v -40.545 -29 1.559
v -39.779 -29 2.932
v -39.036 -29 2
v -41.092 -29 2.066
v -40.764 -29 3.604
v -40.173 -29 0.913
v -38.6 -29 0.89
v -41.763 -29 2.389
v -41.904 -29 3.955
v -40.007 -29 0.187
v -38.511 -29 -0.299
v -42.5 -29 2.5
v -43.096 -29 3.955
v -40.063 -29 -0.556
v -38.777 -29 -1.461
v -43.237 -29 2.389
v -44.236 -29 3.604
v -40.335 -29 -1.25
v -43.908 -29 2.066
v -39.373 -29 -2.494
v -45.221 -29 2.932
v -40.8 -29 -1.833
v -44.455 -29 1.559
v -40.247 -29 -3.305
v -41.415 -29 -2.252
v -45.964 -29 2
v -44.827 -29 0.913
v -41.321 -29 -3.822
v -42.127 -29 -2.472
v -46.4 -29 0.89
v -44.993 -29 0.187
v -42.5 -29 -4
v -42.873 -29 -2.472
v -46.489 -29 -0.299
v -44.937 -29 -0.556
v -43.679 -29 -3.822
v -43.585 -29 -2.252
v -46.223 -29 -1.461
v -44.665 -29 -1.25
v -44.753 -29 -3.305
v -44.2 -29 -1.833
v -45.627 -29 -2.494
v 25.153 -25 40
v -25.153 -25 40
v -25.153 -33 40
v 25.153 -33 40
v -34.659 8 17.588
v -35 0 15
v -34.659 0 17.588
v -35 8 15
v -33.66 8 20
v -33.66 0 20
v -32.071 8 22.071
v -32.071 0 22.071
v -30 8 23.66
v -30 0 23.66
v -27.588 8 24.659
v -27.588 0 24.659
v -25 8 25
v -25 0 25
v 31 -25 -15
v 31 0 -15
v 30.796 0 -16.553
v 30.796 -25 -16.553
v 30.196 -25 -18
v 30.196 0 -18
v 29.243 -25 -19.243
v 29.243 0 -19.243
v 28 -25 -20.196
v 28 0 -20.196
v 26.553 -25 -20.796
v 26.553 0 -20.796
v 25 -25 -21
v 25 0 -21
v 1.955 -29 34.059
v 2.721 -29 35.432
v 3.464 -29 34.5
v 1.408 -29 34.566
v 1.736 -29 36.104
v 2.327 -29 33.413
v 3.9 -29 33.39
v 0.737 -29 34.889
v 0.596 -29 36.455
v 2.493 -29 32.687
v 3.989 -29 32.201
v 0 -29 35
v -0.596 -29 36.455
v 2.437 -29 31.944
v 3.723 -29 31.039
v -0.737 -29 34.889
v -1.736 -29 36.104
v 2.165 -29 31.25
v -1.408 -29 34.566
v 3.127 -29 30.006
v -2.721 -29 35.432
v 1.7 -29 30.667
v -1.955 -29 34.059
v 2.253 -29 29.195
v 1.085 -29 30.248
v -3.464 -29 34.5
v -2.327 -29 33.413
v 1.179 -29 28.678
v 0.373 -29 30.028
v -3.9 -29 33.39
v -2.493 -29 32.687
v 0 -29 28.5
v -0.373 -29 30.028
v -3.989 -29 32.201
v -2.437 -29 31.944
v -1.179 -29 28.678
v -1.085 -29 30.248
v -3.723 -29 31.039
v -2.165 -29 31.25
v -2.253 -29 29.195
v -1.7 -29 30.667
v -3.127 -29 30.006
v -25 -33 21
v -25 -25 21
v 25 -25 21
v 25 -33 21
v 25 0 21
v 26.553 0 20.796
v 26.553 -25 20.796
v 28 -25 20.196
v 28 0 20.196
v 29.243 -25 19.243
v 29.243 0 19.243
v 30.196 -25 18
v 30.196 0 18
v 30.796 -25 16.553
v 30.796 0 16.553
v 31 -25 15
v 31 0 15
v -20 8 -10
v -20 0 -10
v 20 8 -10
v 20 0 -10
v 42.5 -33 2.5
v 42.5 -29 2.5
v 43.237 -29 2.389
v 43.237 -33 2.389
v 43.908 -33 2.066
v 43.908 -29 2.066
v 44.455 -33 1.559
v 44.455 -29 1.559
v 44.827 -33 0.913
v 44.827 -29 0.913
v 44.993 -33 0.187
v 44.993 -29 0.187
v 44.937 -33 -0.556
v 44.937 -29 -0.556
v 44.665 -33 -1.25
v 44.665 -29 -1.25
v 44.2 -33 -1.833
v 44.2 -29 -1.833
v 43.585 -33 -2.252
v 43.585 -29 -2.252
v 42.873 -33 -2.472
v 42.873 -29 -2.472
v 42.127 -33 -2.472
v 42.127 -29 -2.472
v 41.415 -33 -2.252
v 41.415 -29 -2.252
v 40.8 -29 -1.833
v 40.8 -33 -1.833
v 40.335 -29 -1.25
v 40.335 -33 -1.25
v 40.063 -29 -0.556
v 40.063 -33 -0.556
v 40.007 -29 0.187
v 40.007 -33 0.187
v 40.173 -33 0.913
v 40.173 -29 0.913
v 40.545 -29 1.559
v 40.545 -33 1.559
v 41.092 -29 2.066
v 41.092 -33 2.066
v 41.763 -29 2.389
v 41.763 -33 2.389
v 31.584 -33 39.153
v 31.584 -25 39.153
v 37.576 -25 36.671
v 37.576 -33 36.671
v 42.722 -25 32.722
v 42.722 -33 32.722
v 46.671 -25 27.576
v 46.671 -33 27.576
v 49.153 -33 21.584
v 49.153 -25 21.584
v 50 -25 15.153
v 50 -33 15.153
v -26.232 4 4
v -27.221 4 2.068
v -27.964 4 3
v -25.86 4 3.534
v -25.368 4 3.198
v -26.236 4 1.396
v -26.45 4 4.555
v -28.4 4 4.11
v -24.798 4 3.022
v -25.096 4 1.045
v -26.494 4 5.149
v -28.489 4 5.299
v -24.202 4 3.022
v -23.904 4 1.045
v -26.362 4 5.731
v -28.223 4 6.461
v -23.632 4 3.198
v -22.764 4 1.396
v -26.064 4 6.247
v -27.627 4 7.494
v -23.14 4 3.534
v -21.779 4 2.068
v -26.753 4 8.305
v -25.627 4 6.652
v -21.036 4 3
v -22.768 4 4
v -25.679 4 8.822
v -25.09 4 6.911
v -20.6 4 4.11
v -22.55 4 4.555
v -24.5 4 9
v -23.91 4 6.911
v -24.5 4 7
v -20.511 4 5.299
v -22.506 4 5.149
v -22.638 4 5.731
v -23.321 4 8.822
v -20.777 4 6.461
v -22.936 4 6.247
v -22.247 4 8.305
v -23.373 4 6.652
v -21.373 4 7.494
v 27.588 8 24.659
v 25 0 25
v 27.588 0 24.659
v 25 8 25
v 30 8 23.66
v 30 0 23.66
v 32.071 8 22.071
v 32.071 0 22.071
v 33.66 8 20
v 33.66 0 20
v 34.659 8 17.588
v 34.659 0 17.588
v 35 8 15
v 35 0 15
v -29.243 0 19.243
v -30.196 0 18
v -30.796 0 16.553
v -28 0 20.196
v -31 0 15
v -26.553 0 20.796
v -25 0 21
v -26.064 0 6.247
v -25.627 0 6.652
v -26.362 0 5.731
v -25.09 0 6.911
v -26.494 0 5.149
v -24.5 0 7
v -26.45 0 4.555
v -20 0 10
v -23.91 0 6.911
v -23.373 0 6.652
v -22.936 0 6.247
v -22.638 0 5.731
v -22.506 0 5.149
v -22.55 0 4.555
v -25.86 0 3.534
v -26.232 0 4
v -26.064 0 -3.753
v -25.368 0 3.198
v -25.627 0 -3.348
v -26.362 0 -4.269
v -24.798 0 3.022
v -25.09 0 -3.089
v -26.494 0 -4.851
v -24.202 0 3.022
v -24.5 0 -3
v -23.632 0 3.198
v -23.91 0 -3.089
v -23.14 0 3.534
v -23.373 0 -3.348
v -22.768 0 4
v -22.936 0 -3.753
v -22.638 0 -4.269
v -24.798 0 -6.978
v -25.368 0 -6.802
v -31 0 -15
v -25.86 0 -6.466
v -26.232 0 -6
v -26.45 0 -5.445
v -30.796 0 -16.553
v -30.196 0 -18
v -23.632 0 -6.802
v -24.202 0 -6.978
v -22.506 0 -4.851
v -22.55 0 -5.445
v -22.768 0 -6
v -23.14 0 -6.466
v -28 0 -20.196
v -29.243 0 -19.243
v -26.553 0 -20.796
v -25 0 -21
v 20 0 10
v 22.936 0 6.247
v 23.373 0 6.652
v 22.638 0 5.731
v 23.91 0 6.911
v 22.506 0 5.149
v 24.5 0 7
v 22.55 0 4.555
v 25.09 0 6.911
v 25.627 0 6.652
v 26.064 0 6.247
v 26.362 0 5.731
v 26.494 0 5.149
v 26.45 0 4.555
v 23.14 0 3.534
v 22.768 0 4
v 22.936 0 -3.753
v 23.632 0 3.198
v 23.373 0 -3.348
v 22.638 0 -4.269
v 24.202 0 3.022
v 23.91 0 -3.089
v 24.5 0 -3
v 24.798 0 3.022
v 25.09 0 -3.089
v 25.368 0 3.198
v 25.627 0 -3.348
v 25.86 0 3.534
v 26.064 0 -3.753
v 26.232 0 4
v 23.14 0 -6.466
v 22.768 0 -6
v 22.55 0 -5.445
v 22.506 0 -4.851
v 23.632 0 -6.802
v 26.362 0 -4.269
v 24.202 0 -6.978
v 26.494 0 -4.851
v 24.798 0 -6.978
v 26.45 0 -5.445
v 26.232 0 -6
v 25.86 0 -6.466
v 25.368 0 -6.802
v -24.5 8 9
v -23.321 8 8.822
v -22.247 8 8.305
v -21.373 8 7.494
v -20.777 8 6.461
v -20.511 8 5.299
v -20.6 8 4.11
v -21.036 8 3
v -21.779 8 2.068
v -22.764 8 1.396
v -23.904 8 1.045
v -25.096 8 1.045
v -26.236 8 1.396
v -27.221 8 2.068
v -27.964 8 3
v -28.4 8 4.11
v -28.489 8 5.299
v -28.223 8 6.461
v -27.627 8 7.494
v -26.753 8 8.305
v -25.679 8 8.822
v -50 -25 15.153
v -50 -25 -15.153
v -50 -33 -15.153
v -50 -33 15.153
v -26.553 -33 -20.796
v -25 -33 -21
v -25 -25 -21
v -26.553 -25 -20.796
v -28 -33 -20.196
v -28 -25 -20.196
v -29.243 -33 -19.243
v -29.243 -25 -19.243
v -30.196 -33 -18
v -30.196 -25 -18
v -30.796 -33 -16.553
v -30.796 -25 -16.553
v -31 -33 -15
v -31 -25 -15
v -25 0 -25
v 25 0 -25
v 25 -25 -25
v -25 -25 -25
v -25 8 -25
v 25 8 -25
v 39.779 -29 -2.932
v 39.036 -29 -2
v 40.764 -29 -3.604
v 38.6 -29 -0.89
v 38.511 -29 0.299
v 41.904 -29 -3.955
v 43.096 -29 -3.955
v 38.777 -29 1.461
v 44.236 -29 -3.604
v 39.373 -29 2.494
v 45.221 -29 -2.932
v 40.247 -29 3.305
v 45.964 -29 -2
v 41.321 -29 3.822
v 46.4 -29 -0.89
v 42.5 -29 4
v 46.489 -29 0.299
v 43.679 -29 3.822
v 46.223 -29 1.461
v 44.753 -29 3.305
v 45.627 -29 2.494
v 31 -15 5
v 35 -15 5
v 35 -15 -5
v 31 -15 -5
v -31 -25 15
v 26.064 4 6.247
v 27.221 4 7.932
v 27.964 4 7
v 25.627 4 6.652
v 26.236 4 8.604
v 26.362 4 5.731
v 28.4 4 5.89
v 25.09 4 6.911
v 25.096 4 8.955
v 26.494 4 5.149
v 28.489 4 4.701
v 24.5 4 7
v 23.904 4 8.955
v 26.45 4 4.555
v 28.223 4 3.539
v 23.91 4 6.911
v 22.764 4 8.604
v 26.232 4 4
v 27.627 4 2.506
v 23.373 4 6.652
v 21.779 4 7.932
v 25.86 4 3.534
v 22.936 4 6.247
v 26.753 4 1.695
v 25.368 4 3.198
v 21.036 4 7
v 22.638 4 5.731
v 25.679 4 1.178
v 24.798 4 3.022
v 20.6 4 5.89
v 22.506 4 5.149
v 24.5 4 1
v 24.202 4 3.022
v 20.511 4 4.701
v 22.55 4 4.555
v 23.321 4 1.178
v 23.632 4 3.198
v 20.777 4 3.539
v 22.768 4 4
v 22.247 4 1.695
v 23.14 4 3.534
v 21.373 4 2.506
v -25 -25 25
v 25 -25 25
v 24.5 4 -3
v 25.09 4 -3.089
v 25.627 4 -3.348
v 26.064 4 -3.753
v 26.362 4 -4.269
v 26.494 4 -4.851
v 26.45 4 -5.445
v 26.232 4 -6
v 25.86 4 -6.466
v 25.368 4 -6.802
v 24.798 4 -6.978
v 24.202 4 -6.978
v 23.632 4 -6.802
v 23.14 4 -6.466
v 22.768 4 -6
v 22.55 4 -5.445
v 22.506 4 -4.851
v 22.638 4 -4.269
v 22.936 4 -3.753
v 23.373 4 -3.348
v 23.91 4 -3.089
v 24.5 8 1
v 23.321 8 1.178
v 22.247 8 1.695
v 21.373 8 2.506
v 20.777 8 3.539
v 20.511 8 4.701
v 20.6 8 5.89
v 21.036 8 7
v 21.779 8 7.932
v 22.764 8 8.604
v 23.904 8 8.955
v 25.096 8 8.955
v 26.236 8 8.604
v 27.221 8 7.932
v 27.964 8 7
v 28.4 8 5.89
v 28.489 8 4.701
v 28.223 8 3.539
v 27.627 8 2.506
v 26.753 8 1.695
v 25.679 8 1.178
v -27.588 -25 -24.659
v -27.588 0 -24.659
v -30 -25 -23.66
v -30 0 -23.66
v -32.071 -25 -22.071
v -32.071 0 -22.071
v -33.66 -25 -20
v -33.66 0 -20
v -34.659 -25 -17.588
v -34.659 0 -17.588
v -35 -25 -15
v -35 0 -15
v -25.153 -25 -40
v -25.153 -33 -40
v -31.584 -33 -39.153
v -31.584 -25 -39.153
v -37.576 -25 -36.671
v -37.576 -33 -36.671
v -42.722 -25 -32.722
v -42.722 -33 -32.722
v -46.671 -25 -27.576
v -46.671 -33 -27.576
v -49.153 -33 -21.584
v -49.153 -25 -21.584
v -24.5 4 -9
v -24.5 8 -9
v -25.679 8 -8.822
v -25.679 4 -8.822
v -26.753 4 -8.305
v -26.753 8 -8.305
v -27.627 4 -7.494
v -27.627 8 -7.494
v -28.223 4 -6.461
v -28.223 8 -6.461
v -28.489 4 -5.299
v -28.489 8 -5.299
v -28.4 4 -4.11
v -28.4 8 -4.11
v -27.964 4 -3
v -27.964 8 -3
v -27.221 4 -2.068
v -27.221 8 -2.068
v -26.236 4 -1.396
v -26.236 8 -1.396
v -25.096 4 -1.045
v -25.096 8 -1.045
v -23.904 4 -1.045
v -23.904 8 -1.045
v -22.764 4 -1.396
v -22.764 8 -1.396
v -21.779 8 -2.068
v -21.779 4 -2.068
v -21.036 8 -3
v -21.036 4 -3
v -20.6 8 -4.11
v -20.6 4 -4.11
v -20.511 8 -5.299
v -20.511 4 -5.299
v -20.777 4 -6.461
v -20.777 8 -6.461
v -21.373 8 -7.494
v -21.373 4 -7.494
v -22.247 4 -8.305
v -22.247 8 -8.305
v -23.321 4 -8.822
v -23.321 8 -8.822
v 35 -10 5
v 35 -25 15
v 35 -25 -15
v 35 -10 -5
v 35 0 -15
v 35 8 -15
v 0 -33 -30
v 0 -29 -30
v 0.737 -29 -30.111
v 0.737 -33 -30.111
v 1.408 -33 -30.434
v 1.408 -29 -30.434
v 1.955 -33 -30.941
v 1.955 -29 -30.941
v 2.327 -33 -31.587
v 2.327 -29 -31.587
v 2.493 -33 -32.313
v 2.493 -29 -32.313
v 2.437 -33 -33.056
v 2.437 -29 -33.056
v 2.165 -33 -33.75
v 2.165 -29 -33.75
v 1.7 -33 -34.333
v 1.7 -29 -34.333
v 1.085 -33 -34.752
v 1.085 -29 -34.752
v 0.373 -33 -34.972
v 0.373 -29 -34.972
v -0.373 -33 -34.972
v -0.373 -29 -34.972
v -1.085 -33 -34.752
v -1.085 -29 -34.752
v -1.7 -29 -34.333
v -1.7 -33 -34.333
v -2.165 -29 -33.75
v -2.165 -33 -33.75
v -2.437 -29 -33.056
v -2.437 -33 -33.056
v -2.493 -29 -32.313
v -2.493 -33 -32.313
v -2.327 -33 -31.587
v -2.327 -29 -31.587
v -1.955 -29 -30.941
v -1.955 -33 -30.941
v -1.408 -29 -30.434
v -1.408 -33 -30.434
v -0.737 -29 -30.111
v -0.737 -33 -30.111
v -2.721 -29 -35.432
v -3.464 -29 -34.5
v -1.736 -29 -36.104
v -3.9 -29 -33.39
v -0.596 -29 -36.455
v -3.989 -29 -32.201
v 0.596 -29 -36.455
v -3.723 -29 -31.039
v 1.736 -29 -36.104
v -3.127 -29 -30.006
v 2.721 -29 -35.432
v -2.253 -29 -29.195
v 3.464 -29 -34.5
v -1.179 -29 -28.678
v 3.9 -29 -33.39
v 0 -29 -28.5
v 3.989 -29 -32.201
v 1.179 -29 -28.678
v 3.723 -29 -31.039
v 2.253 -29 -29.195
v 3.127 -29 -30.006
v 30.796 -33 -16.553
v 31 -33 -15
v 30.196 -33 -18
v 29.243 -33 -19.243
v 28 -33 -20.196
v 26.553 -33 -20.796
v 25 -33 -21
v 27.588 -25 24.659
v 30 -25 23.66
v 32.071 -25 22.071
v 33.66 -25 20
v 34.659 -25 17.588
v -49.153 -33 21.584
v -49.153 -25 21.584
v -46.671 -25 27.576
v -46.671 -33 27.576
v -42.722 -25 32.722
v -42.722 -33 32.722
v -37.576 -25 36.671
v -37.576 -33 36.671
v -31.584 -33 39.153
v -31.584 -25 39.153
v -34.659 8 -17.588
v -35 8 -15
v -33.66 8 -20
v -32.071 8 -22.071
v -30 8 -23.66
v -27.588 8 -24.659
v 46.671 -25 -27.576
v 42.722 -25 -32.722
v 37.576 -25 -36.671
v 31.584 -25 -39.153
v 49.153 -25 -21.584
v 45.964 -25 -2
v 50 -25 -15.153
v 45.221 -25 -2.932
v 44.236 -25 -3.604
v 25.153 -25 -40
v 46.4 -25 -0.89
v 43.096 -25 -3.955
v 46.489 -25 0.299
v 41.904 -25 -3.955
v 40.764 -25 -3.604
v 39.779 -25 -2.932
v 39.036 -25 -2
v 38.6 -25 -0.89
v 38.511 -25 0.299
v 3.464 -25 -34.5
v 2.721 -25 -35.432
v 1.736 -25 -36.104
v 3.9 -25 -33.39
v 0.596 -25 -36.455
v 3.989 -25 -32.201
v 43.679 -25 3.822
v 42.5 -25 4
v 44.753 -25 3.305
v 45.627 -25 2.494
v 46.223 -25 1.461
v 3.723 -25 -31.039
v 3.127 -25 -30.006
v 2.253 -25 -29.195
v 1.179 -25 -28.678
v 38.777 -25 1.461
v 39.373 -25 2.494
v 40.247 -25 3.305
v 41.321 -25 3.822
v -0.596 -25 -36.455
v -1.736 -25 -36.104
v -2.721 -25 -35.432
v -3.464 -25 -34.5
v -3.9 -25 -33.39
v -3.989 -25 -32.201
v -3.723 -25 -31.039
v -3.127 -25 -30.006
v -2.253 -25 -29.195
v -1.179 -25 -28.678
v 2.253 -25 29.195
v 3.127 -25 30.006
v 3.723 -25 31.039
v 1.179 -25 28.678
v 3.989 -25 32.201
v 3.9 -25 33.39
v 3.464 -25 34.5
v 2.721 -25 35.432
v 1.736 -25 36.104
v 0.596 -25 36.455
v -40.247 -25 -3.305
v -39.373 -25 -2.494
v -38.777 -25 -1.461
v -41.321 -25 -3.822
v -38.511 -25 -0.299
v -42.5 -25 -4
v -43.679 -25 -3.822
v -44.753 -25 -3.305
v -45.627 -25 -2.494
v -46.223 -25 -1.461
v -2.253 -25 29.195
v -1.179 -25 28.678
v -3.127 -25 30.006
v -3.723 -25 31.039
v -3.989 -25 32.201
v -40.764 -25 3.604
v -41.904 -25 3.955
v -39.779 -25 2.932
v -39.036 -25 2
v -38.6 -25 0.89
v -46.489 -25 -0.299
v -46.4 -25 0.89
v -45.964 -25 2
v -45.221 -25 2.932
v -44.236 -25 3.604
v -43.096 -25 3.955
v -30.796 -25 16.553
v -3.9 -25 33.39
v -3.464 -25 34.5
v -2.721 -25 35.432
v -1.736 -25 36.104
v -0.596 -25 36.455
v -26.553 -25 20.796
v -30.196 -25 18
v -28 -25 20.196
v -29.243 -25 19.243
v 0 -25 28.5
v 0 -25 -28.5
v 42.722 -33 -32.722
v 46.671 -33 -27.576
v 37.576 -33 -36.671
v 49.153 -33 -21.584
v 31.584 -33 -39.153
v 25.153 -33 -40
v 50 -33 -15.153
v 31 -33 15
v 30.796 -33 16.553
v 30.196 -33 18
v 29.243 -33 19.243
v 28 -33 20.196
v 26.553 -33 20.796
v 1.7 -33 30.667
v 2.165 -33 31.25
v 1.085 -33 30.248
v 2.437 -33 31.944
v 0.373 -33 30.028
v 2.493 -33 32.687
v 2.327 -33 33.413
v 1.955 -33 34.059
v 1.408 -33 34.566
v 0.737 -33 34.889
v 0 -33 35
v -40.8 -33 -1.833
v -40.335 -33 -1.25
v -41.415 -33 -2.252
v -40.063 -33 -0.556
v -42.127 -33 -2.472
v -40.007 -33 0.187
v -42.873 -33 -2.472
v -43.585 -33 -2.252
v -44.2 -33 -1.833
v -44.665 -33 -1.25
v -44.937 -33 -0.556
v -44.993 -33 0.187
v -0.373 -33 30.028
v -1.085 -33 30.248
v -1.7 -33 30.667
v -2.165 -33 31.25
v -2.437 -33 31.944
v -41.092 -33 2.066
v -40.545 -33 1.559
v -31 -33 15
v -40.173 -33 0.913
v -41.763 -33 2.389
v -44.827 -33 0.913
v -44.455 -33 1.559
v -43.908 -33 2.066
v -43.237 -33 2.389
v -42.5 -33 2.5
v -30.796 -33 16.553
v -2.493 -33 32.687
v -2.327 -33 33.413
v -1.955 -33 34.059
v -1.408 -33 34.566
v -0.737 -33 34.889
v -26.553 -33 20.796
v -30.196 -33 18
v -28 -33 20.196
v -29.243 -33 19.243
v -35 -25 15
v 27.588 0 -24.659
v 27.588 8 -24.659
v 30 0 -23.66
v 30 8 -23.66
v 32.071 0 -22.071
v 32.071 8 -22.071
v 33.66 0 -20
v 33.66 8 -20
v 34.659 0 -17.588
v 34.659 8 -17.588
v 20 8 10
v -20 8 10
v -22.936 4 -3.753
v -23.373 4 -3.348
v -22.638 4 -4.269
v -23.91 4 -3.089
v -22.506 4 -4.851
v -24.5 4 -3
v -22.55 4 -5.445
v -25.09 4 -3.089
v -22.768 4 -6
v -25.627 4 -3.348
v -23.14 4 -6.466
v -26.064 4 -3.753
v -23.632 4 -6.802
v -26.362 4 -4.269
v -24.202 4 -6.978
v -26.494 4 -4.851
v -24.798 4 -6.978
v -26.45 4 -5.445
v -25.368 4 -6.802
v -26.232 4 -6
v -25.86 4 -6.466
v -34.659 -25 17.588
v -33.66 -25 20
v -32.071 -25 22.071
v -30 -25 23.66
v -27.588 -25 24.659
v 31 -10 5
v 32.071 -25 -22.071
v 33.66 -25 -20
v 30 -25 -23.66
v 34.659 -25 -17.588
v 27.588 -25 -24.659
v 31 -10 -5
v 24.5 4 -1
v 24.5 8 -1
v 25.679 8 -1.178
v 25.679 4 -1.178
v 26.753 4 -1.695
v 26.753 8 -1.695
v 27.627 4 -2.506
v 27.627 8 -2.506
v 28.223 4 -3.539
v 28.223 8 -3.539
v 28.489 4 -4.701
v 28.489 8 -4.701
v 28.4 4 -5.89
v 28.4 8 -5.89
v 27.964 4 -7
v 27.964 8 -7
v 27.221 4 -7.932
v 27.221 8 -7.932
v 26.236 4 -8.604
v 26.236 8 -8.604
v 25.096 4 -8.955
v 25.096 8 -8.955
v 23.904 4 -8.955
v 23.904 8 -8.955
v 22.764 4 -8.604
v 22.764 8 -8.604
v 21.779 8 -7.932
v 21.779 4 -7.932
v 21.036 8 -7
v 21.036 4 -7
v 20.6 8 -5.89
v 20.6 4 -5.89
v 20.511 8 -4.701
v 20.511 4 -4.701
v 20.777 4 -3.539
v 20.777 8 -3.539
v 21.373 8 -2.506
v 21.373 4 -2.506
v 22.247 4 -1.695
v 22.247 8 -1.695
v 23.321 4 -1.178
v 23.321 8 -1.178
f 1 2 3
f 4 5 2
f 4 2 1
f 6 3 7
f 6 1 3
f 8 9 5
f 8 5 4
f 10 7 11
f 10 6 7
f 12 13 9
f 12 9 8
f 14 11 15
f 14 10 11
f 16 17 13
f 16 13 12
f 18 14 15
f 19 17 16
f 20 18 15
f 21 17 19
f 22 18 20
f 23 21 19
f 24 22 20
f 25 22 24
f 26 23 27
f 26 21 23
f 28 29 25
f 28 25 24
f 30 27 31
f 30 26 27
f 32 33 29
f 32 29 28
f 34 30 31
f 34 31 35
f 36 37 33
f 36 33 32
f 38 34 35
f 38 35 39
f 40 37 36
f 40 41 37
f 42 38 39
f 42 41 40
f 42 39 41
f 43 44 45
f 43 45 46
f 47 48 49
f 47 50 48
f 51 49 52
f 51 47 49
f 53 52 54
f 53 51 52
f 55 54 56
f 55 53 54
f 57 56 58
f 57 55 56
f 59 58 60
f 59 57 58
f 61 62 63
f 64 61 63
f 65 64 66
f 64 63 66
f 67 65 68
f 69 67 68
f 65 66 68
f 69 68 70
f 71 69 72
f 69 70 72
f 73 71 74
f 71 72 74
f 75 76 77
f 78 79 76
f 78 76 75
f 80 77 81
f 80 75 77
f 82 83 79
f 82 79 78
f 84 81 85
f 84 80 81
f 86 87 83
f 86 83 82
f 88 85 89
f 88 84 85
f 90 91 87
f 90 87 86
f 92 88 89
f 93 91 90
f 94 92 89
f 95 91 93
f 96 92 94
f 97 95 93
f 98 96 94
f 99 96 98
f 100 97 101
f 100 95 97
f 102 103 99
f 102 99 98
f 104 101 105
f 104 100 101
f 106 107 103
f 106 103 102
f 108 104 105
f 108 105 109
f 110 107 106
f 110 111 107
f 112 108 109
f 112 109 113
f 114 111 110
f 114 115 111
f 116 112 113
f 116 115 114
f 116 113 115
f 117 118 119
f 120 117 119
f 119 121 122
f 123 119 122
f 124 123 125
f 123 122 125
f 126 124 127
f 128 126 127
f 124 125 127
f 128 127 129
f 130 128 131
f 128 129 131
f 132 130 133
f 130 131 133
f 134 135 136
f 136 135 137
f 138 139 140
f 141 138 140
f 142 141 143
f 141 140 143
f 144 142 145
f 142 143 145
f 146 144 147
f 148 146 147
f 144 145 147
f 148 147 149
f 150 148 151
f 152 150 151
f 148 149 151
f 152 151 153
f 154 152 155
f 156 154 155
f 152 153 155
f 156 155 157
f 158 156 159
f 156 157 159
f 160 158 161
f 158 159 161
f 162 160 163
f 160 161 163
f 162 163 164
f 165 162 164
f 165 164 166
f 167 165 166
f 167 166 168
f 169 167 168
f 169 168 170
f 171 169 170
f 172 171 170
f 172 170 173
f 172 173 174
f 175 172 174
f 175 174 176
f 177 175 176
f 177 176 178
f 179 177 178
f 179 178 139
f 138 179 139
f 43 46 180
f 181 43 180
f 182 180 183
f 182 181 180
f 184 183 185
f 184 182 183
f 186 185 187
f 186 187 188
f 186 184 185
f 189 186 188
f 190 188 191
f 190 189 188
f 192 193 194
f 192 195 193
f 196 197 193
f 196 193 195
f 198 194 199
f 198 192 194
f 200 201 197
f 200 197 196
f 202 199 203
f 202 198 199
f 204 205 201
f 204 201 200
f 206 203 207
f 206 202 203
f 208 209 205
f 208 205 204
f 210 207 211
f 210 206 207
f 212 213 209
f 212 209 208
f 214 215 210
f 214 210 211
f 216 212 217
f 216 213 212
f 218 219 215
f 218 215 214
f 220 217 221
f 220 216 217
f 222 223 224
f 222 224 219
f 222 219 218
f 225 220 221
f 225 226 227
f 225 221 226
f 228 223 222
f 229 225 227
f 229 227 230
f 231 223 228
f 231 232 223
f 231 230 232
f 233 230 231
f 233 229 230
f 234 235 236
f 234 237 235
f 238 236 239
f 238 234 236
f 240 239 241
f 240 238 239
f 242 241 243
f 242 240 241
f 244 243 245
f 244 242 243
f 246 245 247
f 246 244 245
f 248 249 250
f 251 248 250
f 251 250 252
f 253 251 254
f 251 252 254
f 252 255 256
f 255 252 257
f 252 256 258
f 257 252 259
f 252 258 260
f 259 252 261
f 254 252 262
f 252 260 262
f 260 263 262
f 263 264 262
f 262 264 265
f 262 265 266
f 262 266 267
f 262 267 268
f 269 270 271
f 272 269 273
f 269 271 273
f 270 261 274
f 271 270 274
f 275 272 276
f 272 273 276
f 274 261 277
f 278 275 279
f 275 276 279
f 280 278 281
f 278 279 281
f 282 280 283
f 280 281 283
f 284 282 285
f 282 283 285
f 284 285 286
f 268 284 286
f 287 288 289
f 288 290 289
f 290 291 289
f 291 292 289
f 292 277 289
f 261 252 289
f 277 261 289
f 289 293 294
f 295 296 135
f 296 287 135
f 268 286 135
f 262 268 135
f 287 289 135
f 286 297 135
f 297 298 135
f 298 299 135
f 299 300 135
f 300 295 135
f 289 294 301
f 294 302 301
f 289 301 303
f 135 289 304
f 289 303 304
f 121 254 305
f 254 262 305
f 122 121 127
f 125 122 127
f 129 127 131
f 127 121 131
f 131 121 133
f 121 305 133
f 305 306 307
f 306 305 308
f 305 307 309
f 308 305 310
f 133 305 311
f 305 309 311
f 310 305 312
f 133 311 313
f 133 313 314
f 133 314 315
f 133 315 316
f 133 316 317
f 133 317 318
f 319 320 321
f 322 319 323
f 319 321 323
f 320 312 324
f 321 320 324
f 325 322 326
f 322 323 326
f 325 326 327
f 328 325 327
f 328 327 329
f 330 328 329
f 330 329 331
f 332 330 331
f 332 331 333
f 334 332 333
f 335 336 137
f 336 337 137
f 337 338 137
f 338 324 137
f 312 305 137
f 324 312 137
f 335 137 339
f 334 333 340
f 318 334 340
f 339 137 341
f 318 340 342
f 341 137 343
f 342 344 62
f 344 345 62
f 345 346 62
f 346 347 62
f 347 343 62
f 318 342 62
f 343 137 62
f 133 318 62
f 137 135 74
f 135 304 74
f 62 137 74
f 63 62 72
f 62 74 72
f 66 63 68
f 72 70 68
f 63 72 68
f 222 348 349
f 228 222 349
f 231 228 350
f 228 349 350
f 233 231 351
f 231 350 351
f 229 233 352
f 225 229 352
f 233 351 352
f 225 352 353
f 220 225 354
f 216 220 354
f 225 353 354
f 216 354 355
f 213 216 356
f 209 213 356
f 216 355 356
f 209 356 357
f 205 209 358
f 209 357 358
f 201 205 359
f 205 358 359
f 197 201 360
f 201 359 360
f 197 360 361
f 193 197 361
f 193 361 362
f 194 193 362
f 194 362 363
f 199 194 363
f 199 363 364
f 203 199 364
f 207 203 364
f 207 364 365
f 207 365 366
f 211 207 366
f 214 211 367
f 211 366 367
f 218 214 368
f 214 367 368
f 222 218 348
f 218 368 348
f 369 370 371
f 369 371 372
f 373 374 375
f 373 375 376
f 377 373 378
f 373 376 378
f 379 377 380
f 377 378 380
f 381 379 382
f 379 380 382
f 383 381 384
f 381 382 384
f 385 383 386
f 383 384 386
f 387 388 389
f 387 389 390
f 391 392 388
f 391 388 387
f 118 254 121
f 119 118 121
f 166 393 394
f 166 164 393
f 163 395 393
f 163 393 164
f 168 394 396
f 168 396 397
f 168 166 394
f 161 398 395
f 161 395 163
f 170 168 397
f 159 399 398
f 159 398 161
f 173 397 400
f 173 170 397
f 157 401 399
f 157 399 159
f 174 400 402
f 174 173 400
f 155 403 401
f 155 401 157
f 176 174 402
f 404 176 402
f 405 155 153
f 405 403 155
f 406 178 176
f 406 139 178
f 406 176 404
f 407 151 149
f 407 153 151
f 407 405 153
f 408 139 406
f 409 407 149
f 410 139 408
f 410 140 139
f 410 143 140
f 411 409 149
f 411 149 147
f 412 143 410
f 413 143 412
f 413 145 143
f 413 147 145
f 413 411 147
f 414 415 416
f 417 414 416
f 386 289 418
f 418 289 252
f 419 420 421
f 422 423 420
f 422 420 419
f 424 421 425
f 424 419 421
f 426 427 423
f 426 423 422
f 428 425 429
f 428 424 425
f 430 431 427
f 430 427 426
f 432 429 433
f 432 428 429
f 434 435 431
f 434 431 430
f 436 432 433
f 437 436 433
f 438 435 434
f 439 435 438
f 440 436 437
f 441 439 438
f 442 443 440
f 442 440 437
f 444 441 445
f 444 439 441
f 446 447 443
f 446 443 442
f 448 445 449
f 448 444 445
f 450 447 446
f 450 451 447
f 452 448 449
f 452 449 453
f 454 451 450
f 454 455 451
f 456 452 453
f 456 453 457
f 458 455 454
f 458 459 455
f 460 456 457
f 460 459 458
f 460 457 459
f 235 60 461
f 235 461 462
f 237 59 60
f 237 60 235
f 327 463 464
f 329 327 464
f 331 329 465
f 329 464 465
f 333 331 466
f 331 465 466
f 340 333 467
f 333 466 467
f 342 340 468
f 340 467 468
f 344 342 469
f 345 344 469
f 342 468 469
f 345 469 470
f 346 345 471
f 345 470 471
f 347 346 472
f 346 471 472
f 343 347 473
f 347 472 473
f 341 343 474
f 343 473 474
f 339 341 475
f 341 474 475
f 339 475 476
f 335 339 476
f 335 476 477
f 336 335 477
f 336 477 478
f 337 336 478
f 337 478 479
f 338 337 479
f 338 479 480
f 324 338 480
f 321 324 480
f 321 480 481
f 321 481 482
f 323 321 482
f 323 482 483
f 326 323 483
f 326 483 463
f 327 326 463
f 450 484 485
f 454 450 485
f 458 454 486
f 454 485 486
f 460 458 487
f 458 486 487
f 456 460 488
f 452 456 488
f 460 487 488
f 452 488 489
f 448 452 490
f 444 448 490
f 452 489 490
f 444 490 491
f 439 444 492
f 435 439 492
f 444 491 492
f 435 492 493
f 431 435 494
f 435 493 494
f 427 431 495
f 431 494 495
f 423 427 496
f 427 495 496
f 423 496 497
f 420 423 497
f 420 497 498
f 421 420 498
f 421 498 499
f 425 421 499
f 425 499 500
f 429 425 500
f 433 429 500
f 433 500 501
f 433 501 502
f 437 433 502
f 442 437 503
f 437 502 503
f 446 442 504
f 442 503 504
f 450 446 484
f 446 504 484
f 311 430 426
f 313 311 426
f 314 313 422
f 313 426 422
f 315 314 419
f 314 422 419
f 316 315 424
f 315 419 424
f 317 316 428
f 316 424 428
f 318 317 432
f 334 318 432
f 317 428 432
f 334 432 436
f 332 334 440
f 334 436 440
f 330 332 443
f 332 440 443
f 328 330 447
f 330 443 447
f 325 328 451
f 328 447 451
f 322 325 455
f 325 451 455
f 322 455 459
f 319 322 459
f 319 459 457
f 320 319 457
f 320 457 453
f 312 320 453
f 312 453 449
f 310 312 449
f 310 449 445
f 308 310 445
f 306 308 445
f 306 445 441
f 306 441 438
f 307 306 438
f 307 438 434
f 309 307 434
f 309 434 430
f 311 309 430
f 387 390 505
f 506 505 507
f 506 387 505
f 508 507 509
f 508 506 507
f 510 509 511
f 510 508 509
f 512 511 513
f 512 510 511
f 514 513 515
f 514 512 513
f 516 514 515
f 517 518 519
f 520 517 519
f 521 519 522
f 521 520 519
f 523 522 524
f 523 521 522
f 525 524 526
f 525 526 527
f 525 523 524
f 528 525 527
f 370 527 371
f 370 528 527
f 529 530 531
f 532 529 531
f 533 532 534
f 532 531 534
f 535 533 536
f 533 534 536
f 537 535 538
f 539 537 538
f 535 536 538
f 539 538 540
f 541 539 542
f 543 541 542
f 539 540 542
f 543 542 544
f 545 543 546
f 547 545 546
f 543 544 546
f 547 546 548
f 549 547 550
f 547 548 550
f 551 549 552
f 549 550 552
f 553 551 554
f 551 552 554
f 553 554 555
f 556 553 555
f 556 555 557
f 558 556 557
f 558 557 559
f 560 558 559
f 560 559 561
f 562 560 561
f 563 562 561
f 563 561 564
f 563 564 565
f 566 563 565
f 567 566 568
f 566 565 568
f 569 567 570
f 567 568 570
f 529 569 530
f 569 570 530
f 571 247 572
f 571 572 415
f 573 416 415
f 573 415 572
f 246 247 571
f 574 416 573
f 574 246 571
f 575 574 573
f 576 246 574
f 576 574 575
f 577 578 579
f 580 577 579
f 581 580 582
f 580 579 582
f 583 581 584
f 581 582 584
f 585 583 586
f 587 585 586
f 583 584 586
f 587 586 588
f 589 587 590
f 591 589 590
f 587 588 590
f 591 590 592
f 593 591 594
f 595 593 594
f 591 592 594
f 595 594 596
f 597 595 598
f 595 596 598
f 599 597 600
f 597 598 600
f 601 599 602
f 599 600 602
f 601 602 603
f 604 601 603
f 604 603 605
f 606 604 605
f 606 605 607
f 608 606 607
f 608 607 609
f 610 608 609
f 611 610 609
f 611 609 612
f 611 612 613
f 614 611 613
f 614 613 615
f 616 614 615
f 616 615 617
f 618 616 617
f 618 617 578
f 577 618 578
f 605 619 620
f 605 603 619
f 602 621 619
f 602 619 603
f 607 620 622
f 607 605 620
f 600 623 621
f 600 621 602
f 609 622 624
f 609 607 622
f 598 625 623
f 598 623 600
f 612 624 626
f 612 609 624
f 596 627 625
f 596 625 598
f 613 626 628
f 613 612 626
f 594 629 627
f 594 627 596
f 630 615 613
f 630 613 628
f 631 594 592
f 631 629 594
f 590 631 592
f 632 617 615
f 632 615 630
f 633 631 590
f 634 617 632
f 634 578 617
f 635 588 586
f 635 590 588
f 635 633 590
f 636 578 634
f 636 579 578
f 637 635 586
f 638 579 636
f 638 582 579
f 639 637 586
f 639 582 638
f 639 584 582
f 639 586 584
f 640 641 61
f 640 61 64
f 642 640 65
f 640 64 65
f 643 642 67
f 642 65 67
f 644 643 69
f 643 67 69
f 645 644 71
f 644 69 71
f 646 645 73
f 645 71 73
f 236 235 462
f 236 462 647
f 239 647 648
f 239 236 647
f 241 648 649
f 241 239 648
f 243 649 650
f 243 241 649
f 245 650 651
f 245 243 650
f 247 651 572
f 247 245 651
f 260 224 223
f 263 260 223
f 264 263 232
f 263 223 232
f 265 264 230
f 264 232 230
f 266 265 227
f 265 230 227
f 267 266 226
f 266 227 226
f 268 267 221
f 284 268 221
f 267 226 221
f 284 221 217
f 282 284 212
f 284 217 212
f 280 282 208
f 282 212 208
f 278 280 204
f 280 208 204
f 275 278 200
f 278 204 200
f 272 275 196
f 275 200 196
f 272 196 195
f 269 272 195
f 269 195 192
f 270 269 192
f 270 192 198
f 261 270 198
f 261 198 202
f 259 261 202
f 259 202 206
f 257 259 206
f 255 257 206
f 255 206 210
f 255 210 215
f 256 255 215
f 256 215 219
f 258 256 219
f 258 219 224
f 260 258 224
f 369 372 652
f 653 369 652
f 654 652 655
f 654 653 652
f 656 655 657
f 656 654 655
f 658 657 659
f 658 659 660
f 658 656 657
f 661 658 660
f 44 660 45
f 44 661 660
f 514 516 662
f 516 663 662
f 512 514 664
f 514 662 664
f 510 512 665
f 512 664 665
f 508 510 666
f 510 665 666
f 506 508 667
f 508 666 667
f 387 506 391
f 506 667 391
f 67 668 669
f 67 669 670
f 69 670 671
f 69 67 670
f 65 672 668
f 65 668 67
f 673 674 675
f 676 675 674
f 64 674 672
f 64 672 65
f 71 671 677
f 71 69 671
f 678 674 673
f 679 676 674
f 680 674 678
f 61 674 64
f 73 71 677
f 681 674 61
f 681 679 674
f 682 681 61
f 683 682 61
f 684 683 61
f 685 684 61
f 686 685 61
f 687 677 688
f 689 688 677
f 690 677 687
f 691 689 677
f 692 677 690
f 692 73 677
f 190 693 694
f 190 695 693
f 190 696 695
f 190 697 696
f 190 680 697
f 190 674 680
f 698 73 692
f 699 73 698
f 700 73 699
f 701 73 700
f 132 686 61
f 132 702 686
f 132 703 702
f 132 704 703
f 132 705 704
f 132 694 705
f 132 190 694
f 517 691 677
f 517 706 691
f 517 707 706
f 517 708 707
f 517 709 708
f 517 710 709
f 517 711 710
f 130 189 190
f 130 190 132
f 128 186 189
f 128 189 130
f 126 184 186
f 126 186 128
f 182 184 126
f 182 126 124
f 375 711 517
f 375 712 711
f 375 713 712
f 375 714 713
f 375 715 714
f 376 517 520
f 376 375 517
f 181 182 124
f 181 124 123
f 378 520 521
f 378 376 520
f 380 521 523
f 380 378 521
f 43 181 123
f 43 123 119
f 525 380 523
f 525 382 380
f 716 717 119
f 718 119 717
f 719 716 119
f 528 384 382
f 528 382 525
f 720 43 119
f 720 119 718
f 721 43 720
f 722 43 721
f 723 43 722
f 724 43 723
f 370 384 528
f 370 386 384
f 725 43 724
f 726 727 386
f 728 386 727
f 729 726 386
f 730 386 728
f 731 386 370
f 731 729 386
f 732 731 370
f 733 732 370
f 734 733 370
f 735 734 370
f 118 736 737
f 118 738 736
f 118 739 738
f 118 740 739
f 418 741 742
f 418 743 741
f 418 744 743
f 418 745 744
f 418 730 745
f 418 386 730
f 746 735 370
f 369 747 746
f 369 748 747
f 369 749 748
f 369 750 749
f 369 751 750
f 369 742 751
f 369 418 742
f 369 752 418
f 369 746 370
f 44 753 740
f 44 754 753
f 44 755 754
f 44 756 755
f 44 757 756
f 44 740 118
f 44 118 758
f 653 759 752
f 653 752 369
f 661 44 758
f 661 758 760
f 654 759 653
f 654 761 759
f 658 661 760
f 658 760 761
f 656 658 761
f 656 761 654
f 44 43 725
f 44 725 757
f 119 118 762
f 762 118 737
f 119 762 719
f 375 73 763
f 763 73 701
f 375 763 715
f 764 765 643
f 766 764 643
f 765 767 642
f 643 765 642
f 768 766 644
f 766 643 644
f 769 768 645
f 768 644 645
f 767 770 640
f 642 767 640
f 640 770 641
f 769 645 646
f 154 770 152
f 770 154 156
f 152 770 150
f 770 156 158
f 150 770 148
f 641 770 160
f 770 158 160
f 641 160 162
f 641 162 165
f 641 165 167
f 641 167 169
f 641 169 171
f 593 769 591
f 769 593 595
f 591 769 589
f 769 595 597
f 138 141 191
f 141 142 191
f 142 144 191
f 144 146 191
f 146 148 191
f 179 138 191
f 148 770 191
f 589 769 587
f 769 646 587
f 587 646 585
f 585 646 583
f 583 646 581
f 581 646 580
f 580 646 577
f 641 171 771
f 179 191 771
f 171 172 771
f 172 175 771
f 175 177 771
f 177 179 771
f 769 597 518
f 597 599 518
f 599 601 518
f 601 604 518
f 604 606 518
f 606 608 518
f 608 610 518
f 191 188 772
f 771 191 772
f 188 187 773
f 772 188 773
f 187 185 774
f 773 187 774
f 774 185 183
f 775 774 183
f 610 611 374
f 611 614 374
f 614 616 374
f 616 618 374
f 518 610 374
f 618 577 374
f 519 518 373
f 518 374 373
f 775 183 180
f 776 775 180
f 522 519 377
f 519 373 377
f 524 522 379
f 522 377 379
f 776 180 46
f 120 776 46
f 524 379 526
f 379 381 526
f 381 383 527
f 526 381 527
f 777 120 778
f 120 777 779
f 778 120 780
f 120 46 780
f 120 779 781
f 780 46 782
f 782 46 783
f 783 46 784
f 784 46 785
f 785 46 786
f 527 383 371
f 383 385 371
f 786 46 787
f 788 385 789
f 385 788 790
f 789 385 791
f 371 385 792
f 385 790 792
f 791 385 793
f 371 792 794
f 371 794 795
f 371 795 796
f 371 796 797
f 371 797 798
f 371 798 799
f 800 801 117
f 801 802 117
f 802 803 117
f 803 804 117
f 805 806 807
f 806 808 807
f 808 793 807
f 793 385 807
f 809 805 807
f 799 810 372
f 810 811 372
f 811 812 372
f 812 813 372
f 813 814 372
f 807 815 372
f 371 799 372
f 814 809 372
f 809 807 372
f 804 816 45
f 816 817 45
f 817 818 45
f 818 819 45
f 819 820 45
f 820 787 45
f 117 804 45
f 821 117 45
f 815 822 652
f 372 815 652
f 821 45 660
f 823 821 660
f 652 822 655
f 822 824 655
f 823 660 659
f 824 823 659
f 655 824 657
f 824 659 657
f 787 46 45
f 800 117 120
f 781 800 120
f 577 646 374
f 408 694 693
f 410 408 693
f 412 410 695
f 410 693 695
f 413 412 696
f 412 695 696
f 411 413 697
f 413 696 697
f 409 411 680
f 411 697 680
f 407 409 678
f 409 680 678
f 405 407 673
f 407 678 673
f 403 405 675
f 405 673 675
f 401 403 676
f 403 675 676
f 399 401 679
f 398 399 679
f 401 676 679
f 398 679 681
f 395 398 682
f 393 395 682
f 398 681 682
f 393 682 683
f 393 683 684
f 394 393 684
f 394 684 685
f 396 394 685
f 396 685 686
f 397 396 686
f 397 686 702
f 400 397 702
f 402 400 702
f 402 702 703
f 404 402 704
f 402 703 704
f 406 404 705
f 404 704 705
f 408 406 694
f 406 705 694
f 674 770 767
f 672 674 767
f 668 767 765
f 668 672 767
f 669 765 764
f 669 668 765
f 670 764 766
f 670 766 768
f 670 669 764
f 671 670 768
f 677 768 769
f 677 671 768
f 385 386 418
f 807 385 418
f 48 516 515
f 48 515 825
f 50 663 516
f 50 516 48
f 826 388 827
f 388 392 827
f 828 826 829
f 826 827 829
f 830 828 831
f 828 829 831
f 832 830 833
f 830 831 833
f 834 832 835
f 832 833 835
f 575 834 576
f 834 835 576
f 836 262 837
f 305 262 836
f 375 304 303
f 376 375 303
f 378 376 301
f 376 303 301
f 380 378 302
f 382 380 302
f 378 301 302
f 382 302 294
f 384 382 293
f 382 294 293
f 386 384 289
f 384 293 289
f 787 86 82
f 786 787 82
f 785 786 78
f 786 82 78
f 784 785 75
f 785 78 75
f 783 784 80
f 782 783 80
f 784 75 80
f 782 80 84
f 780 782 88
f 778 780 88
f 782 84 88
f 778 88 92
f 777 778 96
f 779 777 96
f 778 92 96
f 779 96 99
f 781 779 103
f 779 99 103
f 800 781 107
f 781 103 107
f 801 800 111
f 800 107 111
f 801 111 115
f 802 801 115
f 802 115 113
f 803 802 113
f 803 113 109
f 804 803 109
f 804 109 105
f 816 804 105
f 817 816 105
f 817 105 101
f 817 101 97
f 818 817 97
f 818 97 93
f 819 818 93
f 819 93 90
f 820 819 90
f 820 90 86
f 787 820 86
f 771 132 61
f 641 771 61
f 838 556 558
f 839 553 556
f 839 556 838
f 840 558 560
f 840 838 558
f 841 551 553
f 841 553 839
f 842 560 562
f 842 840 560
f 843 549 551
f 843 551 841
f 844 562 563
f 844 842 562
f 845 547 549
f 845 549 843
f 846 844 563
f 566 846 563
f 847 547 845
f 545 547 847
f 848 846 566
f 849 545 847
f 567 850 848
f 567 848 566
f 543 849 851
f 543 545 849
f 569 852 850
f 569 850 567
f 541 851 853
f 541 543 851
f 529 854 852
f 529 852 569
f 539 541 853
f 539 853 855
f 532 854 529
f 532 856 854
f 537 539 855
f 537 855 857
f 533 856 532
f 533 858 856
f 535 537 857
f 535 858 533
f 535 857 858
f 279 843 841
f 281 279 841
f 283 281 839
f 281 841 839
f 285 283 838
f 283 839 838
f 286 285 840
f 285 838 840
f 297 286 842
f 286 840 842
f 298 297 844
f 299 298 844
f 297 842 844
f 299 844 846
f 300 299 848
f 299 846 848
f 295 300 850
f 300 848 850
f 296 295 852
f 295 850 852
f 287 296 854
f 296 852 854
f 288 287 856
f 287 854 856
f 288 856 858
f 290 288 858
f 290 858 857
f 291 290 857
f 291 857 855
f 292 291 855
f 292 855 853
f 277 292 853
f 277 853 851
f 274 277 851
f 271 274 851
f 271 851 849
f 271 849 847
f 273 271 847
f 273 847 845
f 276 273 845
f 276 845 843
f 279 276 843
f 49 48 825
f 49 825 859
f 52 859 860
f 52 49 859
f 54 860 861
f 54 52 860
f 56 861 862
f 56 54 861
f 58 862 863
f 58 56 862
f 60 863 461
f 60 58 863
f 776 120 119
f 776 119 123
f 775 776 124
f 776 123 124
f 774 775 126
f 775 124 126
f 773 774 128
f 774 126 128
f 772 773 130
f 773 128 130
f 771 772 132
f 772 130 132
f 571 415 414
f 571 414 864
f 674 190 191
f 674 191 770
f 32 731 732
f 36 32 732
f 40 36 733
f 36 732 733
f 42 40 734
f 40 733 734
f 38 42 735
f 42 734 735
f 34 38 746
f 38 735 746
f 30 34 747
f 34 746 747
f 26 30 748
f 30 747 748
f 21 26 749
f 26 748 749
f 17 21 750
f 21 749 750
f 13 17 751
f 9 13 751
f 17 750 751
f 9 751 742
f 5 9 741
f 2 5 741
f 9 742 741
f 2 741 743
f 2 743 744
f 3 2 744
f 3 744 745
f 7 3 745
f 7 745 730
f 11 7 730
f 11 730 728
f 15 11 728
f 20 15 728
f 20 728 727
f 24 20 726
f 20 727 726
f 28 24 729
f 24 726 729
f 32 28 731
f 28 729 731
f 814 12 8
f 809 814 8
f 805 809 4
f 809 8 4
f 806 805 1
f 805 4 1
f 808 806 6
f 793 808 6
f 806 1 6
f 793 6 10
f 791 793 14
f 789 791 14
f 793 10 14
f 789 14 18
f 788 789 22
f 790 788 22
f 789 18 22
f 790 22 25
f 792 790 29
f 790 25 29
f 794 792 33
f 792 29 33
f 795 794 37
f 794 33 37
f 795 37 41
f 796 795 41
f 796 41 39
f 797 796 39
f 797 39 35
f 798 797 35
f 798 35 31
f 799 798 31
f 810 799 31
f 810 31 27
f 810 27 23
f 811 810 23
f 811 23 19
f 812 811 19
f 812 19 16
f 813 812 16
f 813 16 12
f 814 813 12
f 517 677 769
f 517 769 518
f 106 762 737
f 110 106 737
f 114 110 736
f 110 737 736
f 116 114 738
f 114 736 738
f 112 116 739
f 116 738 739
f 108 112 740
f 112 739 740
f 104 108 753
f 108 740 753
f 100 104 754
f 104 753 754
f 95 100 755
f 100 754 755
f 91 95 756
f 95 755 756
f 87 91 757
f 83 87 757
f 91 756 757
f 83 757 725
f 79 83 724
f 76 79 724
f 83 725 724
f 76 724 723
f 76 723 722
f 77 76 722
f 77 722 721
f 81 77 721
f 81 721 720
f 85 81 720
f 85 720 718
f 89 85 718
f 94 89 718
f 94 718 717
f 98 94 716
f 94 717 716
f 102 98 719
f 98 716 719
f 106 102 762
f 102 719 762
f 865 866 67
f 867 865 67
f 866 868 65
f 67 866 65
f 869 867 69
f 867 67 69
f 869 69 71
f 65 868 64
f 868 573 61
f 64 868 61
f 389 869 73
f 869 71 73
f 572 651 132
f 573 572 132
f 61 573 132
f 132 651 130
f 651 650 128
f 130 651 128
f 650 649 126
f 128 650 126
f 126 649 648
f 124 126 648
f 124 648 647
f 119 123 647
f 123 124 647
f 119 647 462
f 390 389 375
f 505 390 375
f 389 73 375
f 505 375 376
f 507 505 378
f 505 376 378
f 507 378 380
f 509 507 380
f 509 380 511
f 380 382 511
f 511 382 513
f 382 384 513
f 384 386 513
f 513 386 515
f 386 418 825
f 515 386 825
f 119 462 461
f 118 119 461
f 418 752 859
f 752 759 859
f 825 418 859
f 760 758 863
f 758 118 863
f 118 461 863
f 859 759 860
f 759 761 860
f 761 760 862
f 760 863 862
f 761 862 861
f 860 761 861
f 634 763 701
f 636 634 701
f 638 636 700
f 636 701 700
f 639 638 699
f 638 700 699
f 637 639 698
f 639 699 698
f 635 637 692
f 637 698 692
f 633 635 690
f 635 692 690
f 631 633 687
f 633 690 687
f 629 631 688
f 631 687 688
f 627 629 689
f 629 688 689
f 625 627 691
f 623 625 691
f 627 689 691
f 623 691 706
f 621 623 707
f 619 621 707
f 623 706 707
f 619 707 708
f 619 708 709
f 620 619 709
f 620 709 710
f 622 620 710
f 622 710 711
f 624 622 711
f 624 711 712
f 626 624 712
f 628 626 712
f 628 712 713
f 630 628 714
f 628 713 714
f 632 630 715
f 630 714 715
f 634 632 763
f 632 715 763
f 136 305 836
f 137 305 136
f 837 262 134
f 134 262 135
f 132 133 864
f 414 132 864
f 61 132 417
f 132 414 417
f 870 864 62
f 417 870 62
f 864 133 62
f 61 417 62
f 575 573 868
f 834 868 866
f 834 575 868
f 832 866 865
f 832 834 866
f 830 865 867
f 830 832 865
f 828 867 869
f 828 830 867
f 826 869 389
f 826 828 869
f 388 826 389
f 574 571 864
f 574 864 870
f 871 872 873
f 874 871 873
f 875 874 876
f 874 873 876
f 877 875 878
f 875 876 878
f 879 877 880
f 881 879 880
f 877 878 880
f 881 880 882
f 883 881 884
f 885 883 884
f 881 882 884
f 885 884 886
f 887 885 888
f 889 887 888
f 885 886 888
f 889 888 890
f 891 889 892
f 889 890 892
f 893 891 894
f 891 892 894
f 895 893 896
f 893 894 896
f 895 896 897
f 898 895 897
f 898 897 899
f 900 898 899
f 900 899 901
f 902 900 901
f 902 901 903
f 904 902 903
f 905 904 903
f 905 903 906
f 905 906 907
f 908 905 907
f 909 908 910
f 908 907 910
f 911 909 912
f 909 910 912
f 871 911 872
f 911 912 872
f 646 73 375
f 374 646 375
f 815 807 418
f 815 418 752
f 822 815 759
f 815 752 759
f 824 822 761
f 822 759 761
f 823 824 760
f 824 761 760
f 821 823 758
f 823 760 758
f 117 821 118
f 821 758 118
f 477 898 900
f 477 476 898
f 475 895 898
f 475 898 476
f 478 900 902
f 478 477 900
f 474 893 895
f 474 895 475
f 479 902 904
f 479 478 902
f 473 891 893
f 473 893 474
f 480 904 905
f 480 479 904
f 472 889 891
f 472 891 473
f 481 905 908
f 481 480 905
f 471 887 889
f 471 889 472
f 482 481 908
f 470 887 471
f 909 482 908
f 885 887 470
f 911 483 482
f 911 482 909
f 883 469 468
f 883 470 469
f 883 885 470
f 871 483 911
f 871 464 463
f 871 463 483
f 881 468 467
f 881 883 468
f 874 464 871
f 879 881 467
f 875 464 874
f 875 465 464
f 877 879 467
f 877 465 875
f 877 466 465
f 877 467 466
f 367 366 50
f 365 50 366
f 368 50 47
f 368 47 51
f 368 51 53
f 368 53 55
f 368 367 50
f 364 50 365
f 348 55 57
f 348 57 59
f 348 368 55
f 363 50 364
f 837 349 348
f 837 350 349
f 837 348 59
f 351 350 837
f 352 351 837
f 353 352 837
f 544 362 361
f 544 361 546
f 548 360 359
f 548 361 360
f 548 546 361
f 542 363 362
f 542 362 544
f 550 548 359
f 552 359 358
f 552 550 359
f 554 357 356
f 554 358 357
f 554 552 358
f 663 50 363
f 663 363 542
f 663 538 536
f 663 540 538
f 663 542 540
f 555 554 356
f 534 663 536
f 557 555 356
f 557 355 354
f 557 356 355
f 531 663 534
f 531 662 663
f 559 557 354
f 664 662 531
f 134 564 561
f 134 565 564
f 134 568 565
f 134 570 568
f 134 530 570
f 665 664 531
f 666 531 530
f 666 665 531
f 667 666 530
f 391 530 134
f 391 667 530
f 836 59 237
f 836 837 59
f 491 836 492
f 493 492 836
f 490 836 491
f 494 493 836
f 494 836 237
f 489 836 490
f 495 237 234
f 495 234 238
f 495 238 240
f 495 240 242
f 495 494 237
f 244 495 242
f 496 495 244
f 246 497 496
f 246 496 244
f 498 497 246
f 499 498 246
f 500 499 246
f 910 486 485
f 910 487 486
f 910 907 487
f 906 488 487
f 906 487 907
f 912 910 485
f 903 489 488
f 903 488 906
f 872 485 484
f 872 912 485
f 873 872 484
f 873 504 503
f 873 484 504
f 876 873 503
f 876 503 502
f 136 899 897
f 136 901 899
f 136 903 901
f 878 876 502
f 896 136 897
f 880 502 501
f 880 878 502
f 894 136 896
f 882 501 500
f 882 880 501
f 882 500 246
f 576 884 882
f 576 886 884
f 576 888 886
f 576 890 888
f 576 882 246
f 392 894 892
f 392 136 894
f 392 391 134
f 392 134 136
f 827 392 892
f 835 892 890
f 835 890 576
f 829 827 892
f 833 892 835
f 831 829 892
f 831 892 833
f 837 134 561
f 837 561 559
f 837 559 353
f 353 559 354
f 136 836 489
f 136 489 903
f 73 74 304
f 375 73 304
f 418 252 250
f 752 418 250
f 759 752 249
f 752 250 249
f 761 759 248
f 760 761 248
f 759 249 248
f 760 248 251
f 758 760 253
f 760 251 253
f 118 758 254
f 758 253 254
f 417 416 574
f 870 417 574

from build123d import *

# Parameters (mm, degrees)
CROQUIS1_W              = 70
CROQUIS1_H              = 50
CROQUIS1_W_2            = 40
CROQUIS1_H_2            = 20
SALIENTE_EXTRUIR1_DEPTH = 8
CROQUIS2_R              = 2
CORTAR_EXTRUIR1_DEPTH   = 15
REDONDEO3_R             = 10
SALIENTE_EXTRUIR2_DEPTH = 25
SALIENTE_EXTRUIR3_DEPTH = 8
CROQUIS5_R              = 2.5
CORTAR_EXTRUIR2_DEPTH   = 10
CROQUIS6_W              = 10
CROQUIS6_H              = 5
CORTAR_EXTRUIR3_DEPTH   = 15
CROQUIS7_R              = 4
CORTAR_EXTRUIR4_DEPTH   = 4
CROQUIS8_R              = 4
CORTAR_EXTRUIR5_DEPTH   = 4


with BuildPart() as part:
    # Croquis1 → Saliente-Extruir1 (new body)
    with BuildSketch(Plane(origin=(0, 0, 0), x_dir=(1, 0, 0), z_dir=(0, 1, 0))):
        Rectangle(CROQUIS1_W, CROQUIS1_H)
        Rectangle(CROQUIS1_W_2, CROQUIS1_H_2, mode=Mode.SUBTRACT)
    extrude(amount=SALIENTE_EXTRUIR1_DEPTH)

    # Croquis2 → Cortar-Extruir1 (cut)
    with BuildSketch(Plane(origin=(0, 8, 0), x_dir=(1, 0, 0), z_dir=(0, 1, 0))):
        with Locations(Location((24.5, -5, 0), (0, 0, 270))):
            Circle(CROQUIS2_R)
        with Locations(Location((24.5, 5, 0), (0, 0, 270))):
            Circle(CROQUIS2_R)
        with Locations(Location((-24.5, -5, 0), (0, 0, 270))):
            Circle(CROQUIS2_R)
        with Locations(Location((-24.5, 5, 0), (0, 0, 270))):
            Circle(CROQUIS2_R)
    extrude(amount=-CORTAR_EXTRUIR1_DEPTH, mode=Mode.SUBTRACT)

    # Redondeo3
    redondeo3_edges = [part.edges().sort_by_distance(p)[0] for p in [
        (-35, 4, -25),
        (35, 4, -25),
        (35, 4, 25),
        (-35, 4, 25),
    ]]
    fillet(redondeo3_edges, radius=REDONDEO3_R)

    # Croquis3 → Saliente-Extruir2 (add)
    with BuildSketch(Plane.XZ):
        with BuildLine():
            Line((-25, 25), (25, 25))
            ThreePointArc((25, 25), (32.071067812, 22.071067812), (35, 15))
            Line((35, 15), (35, -15))
            ThreePointArc((35, -15), (32.071067812, -22.071067812), (25, -25))
            Line((25, -25), (-25, -25))
            ThreePointArc((-25, -25), (-32.071067812, -22.071067812), (-35, -15))
            Line((-35, -15), (-35, 15))
            ThreePointArc((-35, 15), (-32.071067812, 22.071067812), (-25, 25))
        make_face()
        with BuildLine():
            Line((-25, 21), (25, 21))
            ThreePointArc((25, 21), (29.242640687, 19.242640687), (31, 15))
            Line((31, 15), (31, -15))
            ThreePointArc((31, -15), (29.242640687, -19.242640687), (25, -21))
            Line((25, -21), (-25, -21))
            ThreePointArc((-25, -21), (-29.242640687, -19.242640687), (-31, -15))
            Line((-31, -15), (-31, 15))
            ThreePointArc((-31, 15), (-29.242640687, 19.242640687), (-25, 21))
        make_face(mode=Mode.SUBTRACT)
    extrude(amount=SALIENTE_EXTRUIR2_DEPTH)

    # Croquis6 → Cortar-Extruir3 (cut)
    with BuildSketch(Plane(origin=(35, 0, 0), x_dir=(0, 0, -1), z_dir=(1, 0, 0))):
        with Locations((0, -12.5)):
            Rectangle(CROQUIS6_W, CROQUIS6_H)
    extrude(amount=-CORTAR_EXTRUIR3_DEPTH, mode=Mode.SUBTRACT)

    # Croquis7 → Cortar-Extruir4 (cut)
    with BuildSketch(Plane(origin=(0, 8, 0), x_dir=(1, 0, 0), z_dir=(0, 1, 0))):
        with Locations(Location((24.5, 5, 0), (0, 0, 270))):
            Circle(CROQUIS7_R)
        with Locations(Location((24.5, -5, 0), (0, 0, 90))):
            Circle(CROQUIS7_R)
        with Locations(Location((-24.5, -5, 0), (0, 0, 270))):
            Circle(CROQUIS7_R)
        with Locations(Location((-24.5, 5, 0), (0, 0, 90))):
            Circle(CROQUIS7_R)
    extrude(amount=-CORTAR_EXTRUIR4_DEPTH, mode=Mode.SUBTRACT)


with BuildPart() as body_2:
    # Croquis4 → Saliente-Extruir3 (new body)
    with BuildSketch(Plane.XZ.offset(25)):
        with BuildLine():
            Line((-25.152646878, 40), (25.152646878, 40))
            ThreePointArc((25.152646878, 40), (42.722378765, 32.722378765), (50, 15.152646878))
            Line((50, 15.152646878), (50, -15.152646878))
            ThreePointArc((50, -15.152646878), (42.722378765, -32.722378765), (25.152646878, -40))
            Line((25.152646878, -40), (-25.152646878, -40))
            ThreePointArc((-25.152646878, -40), (-42.722378765, -32.722378765), (-50, -15.152646878))
            Line((-50, -15.152646878), (-50, 15.152646878))
            ThreePointArc((-50, 15.152646878), (-42.722378765, 32.722378765), (-25.152646878, 40))
        make_face()
        with BuildLine():
            Line((-25, 21), (25, 21))
            ThreePointArc((25, 21), (29.242640687, 19.242640687), (31, 15))
            Line((31, 15), (31, -15))
            ThreePointArc((31, -15), (29.242640687, -19.242640687), (25, -21))
            Line((25, -21), (-25, -21))
            ThreePointArc((-25, -21), (-29.242640687, -19.242640687), (-31, -15))
            Line((-31, -15), (-31, 15))
            ThreePointArc((-31, 15), (-29.242640687, 19.242640687), (-25, 21))
        make_face(mode=Mode.SUBTRACT)
    extrude(amount=SALIENTE_EXTRUIR3_DEPTH)

    # Croquis5 → Cortar-Extruir2 (cut)
    with BuildSketch(Plane(origin=(0, -25, 0), x_dir=(1, 0, 0), z_dir=(0, 1, 0))):
        with Locations(Location((-42.5, 0, 0), (0, 0, 270))):
            Circle(CROQUIS5_R)
        with Locations(Location((0, 32.5, 0), (0, 0, 270))):
            Circle(CROQUIS5_R)
        with Locations(Location((0, -32.5, 0), (0, 0, 270))):
            Circle(CROQUIS5_R)
        with Locations(Location((42.5, 0, 0), (0, 0, 270))):
            Circle(CROQUIS5_R)
    extrude(amount=-CORTAR_EXTRUIR2_DEPTH, mode=Mode.SUBTRACT)

    # Croquis8 → Cortar-Extruir5 (cut)
    with BuildSketch(Plane(origin=(0, -25, 0), x_dir=(1, 0, 0), z_dir=(0, 1, 0))):
        with Locations(Location((0, 32.5, 0), (0, 0, 270))):
            Circle(CROQUIS8_R)
        with Locations(Location((0, -32.5, 0), (0, 0, 90))):
            Circle(CROQUIS8_R)
        with Locations(Location((42.5, 0, 0), (0, 0, 270))):
            Circle(CROQUIS8_R)
        with Locations(Location((-42.5, 0, 0), (0, 0, 90))):
            Circle(CROQUIS8_R)
    extrude(amount=-CORTAR_EXTRUIR5_DEPTH, mode=Mode.SUBTRACT)


solid = Compound([part.part, body_2.part])
